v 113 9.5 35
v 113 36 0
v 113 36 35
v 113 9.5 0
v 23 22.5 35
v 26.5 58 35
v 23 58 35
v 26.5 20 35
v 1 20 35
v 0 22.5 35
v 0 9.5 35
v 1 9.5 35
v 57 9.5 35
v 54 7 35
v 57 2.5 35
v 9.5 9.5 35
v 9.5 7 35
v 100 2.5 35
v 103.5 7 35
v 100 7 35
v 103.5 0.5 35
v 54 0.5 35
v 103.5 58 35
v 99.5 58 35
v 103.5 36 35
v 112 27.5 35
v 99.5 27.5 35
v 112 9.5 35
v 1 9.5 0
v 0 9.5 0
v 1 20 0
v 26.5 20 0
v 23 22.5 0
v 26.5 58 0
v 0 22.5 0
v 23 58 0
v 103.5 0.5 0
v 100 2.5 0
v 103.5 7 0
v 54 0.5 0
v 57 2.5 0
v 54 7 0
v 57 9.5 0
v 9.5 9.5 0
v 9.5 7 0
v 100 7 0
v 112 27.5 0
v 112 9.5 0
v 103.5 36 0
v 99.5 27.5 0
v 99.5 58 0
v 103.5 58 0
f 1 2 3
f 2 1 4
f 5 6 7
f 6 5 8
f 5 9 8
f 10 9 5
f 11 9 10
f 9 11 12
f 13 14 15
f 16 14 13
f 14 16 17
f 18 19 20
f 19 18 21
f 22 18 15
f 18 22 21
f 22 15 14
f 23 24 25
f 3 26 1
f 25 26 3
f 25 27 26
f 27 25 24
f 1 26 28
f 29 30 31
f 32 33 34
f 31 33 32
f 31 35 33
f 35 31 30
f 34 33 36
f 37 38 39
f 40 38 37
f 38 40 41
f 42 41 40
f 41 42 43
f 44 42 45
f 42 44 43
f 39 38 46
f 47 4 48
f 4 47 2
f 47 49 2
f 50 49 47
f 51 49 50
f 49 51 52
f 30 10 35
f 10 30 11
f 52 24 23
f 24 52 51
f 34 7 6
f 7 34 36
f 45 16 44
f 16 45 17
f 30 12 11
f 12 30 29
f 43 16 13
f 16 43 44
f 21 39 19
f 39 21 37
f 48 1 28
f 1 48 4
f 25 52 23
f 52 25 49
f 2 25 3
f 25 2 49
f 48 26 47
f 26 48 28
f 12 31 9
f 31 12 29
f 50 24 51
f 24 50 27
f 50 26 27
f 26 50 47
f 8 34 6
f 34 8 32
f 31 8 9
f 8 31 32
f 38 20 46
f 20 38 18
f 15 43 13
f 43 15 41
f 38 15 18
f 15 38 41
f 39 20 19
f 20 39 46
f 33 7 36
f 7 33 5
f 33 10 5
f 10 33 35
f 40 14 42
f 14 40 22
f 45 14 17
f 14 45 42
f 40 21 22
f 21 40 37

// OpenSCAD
//Rozmery kovové krabicky vnitrni
krabicka_x=113;
krabicka_y=58;
krabicka_z2=35;  //35

krabicka_otvor_hrana=9.5;

//Rozmery casty modulu
pcb_x=111;
pcb_y=6;

baterka_x=73; 
baterka_y=47; //37

konektor_x=12.5;
konektor_y=12;

SD_karta_x=43;
SD_karta_y=13;

SD_karta_mensi_x=12;
SD_karta_mensi_y=8.5;

dioda_x=25.5;
dioda_y=4.5;

SPACEDOS02A_CAD01A(krabicka_z2);


module SPACEDOS02A_CAD01A(krabicka_z1)
    {
    difference(){

        KRABICKA(krabicka_z1);
            translate([1,15.5,-0.4]) // [1,19.5,-0.5]
                MODUL(krabicka_z1);    
                } 
    }
    



module KRABICKA(krabicka_z)
    {
    difference(){
        cube([krabicka_x,krabicka_y,krabicka_z],center=false);

//otvory
        translate([0,0,-0.5]) 
            cube([krabicka_otvor_hrana,krabicka_otvor_hrana,krabicka_z+1],center=false);
    
        translate([krabicka_x-krabicka_otvor_hrana,0,-0.5]) 
            cube([krabicka_otvor_hrana,krabicka_otvor_hrana,krabicka_z+1],center=false);
        
        translate([0,krabicka_y-krabicka_otvor_hrana,-0.5]) 
            cube([krabicka_otvor_hrana,krabicka_otvor_hrana,krabicka_z+1],center=false);
    
        translate([krabicka_x-krabicka_otvor_hrana,krabicka_y-krabicka_otvor_hrana-12-0.5]) 
            cube([krabicka_otvor_hrana,krabicka_otvor_hrana+20,krabicka_z+1],center=false);


                }
    }   


module MODUL(krabicka_z)
    {

    //pcb
    translate([0,-pcb_y,-0.5]) 
        cube([pcb_x,pcb_y,krabicka_z+1],center=false);

    //konektor
    translate([pcb_x-konektor_x,0,-0.5]) 
        cube([konektor_x,konektor_y,krabicka_z+1],center=false);

    //baterka
    translate([pcb_x-konektor_x-baterka_x,0,-0.5]) 
        cube([baterka_x,baterka_y,krabicka_z+1],center=false);

    //dioda
    translate([pcb_x-konektor_x-baterka_x-dioda_x,0,-0.5]) 
        cube([dioda_x,dioda_y,krabicka_z+1],center=false);

    //SD karta
    translate([pcb_x-SD_karta_x-SD_karta_mensi_x,-SD_karta_y,-0.5]) 
        cube([SD_karta_x,SD_karta_y,krabicka_z+1],center=false);
        
    //SD karta mensi otvor
    translate([pcb_x-SD_karta_mensi_x,-SD_karta_mensi_y,-0.5]) 
        cube([SD_karta_mensi_x,SD_karta_mensi_y,krabicka_z+1],center=false);  
     
    //vyrez levy horni
    translate([-2,7,-0.5]) 
       cube([24,60,krabicka_z+1],center=false);  
        
         //vyrez levy dolni
    translate([-2,-21,-0.5]) 
        cube([55,12.5,krabicka_z+1],center=false);  
     
   //vyrez pravy dolni
    translate([-2,-21,-0.5]) 
        cube([krabicka_x+4,6,krabicka_z+1],center=false);     
        
       //vyrez pravy horni
    translate([-2,7,-0.5]) 
       cube([24,60,krabicka_z+1],center=false);    
    
     }
